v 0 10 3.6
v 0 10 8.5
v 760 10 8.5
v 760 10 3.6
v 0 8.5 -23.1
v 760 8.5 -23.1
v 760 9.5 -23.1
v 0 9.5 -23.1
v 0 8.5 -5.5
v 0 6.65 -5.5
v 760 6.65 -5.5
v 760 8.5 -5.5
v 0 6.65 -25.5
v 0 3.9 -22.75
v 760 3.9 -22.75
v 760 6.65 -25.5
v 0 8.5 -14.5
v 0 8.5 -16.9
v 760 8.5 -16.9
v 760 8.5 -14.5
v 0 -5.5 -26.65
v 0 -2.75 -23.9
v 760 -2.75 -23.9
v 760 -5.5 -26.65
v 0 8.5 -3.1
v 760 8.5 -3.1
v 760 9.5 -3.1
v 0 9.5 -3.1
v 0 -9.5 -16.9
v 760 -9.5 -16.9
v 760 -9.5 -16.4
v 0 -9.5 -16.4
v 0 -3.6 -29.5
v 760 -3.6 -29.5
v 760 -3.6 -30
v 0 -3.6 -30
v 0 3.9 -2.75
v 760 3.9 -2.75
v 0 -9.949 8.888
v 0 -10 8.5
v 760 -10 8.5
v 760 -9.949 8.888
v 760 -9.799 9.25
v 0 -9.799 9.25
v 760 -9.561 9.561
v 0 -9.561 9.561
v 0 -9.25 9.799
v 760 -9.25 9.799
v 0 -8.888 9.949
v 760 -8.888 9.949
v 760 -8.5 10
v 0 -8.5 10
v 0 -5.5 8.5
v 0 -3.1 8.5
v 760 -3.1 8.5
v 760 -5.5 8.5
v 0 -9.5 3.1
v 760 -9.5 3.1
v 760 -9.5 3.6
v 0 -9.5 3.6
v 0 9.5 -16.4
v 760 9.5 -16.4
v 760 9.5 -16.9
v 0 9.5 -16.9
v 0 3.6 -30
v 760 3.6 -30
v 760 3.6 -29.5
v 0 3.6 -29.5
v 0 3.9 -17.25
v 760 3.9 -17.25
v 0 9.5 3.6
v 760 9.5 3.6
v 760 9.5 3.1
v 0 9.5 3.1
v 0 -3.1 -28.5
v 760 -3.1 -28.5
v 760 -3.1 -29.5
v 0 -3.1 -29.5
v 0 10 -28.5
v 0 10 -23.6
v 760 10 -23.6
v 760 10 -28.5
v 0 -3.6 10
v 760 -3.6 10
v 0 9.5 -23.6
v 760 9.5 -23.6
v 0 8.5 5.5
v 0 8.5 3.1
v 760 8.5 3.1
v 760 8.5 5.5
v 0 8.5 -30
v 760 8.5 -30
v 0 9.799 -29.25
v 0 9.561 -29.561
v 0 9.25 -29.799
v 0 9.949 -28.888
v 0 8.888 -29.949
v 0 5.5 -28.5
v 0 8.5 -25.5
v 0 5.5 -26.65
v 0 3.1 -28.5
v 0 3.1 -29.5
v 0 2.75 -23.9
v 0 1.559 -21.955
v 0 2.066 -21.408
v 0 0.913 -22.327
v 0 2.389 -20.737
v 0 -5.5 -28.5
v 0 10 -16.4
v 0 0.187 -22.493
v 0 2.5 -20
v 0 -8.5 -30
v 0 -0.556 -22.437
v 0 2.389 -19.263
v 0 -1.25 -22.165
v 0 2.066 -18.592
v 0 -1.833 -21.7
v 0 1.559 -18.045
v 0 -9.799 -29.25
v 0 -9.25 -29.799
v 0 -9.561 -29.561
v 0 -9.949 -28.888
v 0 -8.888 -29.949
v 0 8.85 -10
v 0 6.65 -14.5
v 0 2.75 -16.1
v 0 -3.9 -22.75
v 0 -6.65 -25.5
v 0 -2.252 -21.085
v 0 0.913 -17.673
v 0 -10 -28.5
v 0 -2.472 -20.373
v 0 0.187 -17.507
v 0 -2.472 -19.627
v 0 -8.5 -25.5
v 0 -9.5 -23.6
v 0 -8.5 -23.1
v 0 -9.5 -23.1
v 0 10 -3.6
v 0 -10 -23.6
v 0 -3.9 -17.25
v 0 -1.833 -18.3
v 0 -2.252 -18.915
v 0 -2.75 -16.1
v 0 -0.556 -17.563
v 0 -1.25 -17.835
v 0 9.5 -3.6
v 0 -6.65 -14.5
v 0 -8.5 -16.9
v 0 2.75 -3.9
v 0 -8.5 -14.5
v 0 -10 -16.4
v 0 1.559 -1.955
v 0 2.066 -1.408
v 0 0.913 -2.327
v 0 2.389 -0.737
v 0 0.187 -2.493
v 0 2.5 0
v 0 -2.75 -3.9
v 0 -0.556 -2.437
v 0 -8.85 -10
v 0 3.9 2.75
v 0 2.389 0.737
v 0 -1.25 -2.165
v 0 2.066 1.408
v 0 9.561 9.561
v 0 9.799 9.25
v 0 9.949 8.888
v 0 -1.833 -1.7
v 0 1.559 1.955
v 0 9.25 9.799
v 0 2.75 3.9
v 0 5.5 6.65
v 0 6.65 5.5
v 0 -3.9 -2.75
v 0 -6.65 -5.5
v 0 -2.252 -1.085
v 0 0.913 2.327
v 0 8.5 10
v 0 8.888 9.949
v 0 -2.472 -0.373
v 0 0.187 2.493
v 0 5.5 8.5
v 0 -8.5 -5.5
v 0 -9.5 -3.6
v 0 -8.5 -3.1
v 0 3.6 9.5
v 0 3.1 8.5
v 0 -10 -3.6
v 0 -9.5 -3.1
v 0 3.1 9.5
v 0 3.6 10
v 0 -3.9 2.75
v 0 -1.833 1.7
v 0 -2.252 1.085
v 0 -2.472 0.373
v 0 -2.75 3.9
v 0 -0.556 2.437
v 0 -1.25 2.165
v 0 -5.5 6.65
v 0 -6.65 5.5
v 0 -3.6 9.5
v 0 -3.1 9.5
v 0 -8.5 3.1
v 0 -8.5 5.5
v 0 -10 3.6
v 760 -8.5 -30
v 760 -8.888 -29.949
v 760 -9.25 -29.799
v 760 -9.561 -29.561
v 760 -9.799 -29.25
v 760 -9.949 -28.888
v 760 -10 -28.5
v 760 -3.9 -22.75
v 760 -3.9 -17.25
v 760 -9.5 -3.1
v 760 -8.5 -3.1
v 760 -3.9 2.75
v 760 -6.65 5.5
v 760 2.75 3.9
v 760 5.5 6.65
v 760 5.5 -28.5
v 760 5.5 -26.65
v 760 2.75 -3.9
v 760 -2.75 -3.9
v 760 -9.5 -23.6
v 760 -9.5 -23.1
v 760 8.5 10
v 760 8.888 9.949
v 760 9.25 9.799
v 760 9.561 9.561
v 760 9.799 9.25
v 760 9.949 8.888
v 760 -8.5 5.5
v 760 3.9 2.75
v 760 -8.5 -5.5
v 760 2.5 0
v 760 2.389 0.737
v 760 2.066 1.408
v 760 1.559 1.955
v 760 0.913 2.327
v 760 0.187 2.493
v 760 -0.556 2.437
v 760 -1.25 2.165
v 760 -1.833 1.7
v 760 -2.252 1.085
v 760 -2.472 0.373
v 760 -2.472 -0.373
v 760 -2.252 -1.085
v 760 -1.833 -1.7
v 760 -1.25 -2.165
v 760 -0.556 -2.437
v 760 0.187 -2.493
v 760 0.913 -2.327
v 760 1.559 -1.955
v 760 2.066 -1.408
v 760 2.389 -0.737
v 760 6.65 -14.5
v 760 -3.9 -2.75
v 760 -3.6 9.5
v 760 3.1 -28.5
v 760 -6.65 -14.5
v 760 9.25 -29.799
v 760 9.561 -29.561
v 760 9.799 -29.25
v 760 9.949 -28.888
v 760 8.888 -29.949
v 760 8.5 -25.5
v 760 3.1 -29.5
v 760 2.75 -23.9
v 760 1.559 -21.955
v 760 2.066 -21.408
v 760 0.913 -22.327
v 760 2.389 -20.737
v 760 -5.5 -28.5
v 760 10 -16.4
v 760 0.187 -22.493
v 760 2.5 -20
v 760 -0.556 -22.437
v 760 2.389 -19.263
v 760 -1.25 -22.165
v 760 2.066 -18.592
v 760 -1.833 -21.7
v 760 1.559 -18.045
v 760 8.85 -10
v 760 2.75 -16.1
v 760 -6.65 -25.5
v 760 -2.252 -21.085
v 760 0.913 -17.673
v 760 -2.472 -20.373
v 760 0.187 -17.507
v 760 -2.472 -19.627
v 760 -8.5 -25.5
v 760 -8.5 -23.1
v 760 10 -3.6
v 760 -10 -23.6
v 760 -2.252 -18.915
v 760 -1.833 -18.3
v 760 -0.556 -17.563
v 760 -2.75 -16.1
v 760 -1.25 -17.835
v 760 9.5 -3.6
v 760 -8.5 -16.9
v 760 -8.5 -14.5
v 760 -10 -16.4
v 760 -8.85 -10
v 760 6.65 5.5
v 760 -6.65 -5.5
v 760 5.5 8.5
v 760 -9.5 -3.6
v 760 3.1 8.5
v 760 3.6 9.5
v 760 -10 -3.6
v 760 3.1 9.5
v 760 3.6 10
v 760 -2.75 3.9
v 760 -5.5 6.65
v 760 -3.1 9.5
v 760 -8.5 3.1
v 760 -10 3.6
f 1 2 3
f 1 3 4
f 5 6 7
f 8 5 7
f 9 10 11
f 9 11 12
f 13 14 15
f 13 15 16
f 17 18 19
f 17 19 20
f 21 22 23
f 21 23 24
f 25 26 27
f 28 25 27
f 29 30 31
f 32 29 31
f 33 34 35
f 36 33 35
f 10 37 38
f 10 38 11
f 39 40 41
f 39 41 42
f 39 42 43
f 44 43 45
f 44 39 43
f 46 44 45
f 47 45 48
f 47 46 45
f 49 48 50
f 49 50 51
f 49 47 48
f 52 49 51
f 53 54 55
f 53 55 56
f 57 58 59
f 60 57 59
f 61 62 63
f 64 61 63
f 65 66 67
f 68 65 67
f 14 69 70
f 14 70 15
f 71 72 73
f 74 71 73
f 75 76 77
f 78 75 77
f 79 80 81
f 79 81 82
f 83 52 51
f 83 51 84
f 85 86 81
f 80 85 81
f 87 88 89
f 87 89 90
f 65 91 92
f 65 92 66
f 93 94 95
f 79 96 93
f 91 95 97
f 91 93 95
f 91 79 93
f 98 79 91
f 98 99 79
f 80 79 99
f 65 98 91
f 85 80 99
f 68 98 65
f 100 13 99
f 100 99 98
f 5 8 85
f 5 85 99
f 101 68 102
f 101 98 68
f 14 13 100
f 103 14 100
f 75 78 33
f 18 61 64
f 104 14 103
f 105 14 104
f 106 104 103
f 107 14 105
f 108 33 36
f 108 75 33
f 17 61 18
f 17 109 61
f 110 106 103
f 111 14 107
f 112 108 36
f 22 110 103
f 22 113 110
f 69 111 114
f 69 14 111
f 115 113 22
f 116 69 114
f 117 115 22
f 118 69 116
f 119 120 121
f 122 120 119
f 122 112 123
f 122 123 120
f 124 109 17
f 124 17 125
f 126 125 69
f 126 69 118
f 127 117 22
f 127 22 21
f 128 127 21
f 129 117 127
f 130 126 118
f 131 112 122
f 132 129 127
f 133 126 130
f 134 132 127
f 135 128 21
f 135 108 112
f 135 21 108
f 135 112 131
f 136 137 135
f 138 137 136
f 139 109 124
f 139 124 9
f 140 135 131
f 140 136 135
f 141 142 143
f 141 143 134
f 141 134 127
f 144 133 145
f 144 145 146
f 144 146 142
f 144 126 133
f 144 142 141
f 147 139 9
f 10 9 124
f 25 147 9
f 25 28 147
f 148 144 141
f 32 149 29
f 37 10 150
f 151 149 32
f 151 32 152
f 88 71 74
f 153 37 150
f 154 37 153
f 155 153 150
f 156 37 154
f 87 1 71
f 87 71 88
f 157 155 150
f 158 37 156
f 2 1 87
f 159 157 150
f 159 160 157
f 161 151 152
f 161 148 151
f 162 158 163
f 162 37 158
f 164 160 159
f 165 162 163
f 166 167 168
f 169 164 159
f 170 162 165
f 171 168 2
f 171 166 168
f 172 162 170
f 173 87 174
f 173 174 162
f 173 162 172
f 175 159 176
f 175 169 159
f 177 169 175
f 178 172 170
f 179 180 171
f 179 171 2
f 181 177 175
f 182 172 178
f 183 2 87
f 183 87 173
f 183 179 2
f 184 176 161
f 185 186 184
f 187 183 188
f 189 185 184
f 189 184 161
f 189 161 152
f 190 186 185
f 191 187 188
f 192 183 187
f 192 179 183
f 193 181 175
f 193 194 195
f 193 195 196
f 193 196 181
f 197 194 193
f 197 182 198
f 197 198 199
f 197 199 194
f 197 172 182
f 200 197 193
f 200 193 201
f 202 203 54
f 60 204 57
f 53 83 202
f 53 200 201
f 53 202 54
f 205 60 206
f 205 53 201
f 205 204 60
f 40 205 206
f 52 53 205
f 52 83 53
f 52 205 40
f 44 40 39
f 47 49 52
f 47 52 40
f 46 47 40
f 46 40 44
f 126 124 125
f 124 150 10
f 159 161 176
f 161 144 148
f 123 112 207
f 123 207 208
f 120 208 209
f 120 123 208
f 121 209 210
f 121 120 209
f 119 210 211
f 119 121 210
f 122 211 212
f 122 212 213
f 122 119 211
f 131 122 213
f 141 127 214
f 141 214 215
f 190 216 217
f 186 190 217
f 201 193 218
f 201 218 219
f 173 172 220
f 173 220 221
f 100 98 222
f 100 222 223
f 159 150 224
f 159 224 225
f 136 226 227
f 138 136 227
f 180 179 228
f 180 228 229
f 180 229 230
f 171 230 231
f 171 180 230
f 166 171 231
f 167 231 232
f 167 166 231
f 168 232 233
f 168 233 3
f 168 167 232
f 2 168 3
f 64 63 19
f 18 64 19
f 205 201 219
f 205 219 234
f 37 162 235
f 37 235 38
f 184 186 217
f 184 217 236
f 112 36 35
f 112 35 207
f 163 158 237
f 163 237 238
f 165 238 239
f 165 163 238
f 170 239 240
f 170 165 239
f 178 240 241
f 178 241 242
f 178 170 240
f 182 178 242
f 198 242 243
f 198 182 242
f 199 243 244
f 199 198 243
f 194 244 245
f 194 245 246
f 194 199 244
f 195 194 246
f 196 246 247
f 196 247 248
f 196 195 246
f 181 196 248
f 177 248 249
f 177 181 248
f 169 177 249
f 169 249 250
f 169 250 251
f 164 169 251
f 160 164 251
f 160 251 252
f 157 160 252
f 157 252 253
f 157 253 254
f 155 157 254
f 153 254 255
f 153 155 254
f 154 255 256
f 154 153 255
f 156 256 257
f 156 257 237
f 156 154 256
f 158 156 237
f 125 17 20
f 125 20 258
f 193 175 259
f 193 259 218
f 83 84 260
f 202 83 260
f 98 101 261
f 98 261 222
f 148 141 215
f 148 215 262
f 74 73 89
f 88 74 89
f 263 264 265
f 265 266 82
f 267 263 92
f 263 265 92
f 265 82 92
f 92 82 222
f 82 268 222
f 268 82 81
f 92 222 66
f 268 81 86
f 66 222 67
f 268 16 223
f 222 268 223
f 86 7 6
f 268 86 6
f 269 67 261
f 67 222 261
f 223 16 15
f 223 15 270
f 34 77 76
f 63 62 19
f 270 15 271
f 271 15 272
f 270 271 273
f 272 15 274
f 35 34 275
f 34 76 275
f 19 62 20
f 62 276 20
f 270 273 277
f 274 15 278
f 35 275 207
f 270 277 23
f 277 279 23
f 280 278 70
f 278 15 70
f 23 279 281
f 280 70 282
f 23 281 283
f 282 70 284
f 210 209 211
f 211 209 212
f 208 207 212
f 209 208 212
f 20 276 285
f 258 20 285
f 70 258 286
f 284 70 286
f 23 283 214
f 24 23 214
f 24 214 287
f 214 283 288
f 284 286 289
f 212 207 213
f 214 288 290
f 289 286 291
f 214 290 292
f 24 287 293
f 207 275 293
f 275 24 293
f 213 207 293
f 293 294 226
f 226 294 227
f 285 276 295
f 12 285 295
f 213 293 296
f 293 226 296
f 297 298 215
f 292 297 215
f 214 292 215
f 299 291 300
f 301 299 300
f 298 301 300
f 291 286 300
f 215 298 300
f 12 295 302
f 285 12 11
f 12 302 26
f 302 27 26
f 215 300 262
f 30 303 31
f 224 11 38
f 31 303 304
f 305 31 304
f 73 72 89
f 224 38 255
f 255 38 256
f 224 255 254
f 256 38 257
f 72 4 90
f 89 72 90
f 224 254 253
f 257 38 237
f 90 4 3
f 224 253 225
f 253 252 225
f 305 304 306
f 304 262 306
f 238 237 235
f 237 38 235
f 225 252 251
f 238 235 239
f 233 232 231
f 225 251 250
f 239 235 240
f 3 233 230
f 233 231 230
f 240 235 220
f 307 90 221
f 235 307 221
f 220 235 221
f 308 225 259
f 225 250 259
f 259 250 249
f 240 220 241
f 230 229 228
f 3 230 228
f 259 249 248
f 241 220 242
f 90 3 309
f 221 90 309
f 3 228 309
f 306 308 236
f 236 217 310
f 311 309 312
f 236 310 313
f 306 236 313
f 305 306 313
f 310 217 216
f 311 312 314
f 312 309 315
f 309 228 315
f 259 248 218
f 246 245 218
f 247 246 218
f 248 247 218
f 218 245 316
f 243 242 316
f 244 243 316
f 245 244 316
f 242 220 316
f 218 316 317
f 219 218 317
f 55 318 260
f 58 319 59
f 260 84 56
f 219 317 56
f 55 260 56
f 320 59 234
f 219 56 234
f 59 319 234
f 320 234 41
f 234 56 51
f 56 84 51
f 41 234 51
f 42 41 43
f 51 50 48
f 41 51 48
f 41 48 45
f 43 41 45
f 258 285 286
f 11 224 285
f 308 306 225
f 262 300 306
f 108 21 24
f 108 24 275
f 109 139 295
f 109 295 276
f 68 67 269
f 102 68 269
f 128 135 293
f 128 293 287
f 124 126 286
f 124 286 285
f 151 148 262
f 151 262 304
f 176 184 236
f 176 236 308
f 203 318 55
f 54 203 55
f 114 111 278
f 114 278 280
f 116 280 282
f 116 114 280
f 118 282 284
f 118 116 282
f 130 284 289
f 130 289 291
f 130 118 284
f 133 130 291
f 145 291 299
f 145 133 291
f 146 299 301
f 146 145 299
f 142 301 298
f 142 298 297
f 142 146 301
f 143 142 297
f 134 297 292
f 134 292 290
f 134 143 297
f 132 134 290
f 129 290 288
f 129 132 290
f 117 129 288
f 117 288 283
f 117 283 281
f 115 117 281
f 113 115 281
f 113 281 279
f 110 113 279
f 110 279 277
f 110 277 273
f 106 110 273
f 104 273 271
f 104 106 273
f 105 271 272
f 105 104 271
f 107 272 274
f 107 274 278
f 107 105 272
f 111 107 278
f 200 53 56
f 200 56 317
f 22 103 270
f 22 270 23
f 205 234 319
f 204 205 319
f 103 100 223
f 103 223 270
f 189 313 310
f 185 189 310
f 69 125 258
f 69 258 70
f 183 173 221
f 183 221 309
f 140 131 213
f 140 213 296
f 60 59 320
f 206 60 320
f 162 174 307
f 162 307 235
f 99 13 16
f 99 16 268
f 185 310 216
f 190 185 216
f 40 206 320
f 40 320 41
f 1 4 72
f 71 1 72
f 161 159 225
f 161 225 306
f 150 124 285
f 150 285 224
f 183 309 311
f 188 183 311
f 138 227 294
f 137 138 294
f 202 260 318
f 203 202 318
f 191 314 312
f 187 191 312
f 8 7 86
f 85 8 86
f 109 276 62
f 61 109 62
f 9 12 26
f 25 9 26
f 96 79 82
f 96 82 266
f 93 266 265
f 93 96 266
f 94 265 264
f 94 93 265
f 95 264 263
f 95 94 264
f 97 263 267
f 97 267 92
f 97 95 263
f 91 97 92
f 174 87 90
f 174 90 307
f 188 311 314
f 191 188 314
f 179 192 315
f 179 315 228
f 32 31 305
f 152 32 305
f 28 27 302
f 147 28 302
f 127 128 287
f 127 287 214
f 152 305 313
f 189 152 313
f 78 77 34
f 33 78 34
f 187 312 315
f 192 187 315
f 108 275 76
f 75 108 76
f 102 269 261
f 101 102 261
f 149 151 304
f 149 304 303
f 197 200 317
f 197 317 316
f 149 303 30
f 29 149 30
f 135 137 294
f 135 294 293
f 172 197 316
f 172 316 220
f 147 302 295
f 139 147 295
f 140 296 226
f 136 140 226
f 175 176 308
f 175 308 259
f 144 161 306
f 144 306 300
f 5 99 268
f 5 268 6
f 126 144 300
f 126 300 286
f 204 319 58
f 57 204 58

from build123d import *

# Parameters (mm, degrees)
SKETCH1_R                = 2.5
F_20_X_40_X_T1_5_1_DEPTH = 760


with BuildPart() as part:
    # Sketch1 → 铝型材 20 X 40 X T1.5(1) (new body)
    with BuildSketch(Plane.YZ):
        with BuildLine():
            Line((-3.6, 10), (-3.6, 9.5))
            Line((-3.6, 9.5), (-3.1, 9.5))
            Line((-3.1, 9.5), (-3.1, 8.5))
            Line((-3.1, 8.5), (-5.5, 8.5))
            Line((-5.5, 8.5), (-5.5, 6.65))
            Line((-5.5, 6.65), (-2.75, 3.9))
            Line((-2.75, 3.9), (2.75, 3.9))
            Line((2.75, 3.9), (5.5, 6.65))
            Line((5.5, 6.65), (5.5, 8.5))
            Line((5.5, 8.5), (3.1, 8.5))
            Line((3.1, 8.5), (3.1, 9.5))
            Line((3.1, 9.5), (3.6, 9.5))
            Line((3.6, 9.5), (3.6, 10))
            Line((3.6, 10), (8.5, 10))
            ThreePointArc((8.5, 10), (9.560660172, 9.560660172), (10, 8.5))
            Line((10, 8.5), (10, 3.6))
            Line((10, 3.6), (9.5, 3.6))
            Line((9.5, 3.6), (9.5, 3.1))
            Line((9.5, 3.1), (8.5, 3.1))
            Line((8.5, 3.1), (8.5, 5.5))
            Line((8.5, 5.5), (6.65, 5.5))
            Line((6.65, 5.5), (3.9, 2.75))
            Line((3.9, 2.75), (3.9, -2.75))
            Line((3.9, -2.75), (6.65, -5.5))
            Line((6.65, -5.5), (8.5, -5.5))
            Line((8.5, -5.5), (8.5, -3.1))
            Line((8.5, -3.1), (9.5, -3.1))
            Line((9.5, -3.1), (9.5, -3.6))
            Line((9.5, -3.6), (10, -3.6))
            Line((10, -3.6), (10, -16.4))
            Line((10, -16.4), (9.5, -16.4))
            Line((9.5, -16.4), (9.5, -16.9))
            Line((9.5, -16.9), (8.5, -16.9))
            Line((8.5, -16.9), (8.5, -14.5))
            Line((8.5, -14.5), (6.65, -14.5))
            Line((6.65, -14.5), (3.9, -17.25))
            Line((3.9, -17.25), (3.9, -22.75))
            Line((3.9, -22.75), (6.65, -25.5))
            Line((6.65, -25.5), (8.5, -25.5))
            Line((8.5, -25.5), (8.5, -23.1))
            Line((8.5, -23.1), (9.5, -23.1))
            Line((9.5, -23.1), (9.5, -23.6))
            Line((9.5, -23.6), (10, -23.6))
            Line((10, -23.6), (10, -28.5))
            ThreePointArc((10, -28.5), (9.560660172, -29.560660172), (8.5, -30))
            Line((8.5, -30), (3.6, -30))
            Line((3.6, -30), (3.6, -29.5))
            Line((3.6, -29.5), (3.1, -29.5))
            Line((3.1, -29.5), (3.1, -28.5))
            Line((3.1, -28.5), (5.5, -28.5))
            Line((5.5, -28.5), (5.5, -26.65))
            Line((5.5, -26.65), (2.75, -23.9))
            Line((2.75, -23.9), (-2.75, -23.9))
            Line((-2.75, -23.9), (-5.5, -26.65))
            Line((-5.5, -26.65), (-5.5, -28.5))
            Line((-5.5, -28.5), (-3.1, -28.5))
            Line((-3.1, -28.5), (-3.1, -29.5))
            Line((-3.1, -29.5), (-3.6, -29.5))
            Line((-3.6, -29.5), (-3.6, -30))
            Line((-3.6, -30), (-8.5, -30))
            ThreePointArc((-8.5, -30), (-9.560660172, -29.560660172), (-10, -28.5))
            Line((-10, -28.5), (-10, -23.6))
            Line((-10, -23.6), (-9.5, -23.6))
            Line((-9.5, -23.6), (-9.5, -23.1))
            Line((-9.5, -23.1), (-8.5, -23.1))
            Line((-8.5, -23.1), (-8.5, -25.5))
            Line((-8.5, -25.5), (-6.65, -25.5))
            Line((-6.65, -25.5), (-3.9, -22.75))
            Line((-3.9, -22.75), (-3.9, -17.25))
            Line((-3.9, -17.25), (-6.65, -14.5))
            Line((-6.65, -14.5), (-8.5, -14.5))
            Line((-8.5, -14.5), (-8.5, -16.9))
            Line((-8.5, -16.9), (-9.5, -16.9))
            Line((-9.5, -16.9), (-9.5, -16.4))
            Line((-9.5, -16.4), (-10, -16.4))
            Line((-10, -16.4), (-10, -3.6))
            Line((-10, -3.6), (-9.5, -3.6))
            Line((-9.5, -3.6), (-9.5, -3.1))
            Line((-9.5, -3.1), (-8.5, -3.1))
            Line((-8.5, -3.1), (-8.5, -5.5))
            Line((-8.5, -5.5), (-6.65, -5.5))
            Line((-6.65, -5.5), (-3.9, -2.75))
            Line((-3.9, -2.75), (-3.9, 2.75))
            Line((-3.9, 2.75), (-6.65, 5.5))
            Line((-6.65, 5.5), (-8.5, 5.5))
            Line((-8.5, 5.5), (-8.5, 3.1))
            Line((-8.5, 3.1), (-9.5, 3.1))
            Line((-9.5, 3.1), (-9.5, 3.6))
            Line((-9.5, 3.6), (-10, 3.6))
            Line((-10, 3.6), (-10, 8.5))
            ThreePointArc((-10, 8.5), (-9.560660172, 9.560660172), (-8.5, 10))
            Line((-8.5, 10), (-3.6, 10))
        make_face()
        Circle(SKETCH1_R, mode=Mode.SUBTRACT)
        with Locations((0, -20)):
            Circle(SKETCH1_R, mode=Mode.SUBTRACT)
        Polygon((8.85, -10), (2.75, -3.9), (-2.75, -3.9), (-8.85, -10), (-2.75, -16.1), (2.75, -16.1), align=None, mode=Mode.SUBTRACT)
    extrude(amount=F_20_X_40_X_T1_5_1_DEPTH)


solid = part.part
